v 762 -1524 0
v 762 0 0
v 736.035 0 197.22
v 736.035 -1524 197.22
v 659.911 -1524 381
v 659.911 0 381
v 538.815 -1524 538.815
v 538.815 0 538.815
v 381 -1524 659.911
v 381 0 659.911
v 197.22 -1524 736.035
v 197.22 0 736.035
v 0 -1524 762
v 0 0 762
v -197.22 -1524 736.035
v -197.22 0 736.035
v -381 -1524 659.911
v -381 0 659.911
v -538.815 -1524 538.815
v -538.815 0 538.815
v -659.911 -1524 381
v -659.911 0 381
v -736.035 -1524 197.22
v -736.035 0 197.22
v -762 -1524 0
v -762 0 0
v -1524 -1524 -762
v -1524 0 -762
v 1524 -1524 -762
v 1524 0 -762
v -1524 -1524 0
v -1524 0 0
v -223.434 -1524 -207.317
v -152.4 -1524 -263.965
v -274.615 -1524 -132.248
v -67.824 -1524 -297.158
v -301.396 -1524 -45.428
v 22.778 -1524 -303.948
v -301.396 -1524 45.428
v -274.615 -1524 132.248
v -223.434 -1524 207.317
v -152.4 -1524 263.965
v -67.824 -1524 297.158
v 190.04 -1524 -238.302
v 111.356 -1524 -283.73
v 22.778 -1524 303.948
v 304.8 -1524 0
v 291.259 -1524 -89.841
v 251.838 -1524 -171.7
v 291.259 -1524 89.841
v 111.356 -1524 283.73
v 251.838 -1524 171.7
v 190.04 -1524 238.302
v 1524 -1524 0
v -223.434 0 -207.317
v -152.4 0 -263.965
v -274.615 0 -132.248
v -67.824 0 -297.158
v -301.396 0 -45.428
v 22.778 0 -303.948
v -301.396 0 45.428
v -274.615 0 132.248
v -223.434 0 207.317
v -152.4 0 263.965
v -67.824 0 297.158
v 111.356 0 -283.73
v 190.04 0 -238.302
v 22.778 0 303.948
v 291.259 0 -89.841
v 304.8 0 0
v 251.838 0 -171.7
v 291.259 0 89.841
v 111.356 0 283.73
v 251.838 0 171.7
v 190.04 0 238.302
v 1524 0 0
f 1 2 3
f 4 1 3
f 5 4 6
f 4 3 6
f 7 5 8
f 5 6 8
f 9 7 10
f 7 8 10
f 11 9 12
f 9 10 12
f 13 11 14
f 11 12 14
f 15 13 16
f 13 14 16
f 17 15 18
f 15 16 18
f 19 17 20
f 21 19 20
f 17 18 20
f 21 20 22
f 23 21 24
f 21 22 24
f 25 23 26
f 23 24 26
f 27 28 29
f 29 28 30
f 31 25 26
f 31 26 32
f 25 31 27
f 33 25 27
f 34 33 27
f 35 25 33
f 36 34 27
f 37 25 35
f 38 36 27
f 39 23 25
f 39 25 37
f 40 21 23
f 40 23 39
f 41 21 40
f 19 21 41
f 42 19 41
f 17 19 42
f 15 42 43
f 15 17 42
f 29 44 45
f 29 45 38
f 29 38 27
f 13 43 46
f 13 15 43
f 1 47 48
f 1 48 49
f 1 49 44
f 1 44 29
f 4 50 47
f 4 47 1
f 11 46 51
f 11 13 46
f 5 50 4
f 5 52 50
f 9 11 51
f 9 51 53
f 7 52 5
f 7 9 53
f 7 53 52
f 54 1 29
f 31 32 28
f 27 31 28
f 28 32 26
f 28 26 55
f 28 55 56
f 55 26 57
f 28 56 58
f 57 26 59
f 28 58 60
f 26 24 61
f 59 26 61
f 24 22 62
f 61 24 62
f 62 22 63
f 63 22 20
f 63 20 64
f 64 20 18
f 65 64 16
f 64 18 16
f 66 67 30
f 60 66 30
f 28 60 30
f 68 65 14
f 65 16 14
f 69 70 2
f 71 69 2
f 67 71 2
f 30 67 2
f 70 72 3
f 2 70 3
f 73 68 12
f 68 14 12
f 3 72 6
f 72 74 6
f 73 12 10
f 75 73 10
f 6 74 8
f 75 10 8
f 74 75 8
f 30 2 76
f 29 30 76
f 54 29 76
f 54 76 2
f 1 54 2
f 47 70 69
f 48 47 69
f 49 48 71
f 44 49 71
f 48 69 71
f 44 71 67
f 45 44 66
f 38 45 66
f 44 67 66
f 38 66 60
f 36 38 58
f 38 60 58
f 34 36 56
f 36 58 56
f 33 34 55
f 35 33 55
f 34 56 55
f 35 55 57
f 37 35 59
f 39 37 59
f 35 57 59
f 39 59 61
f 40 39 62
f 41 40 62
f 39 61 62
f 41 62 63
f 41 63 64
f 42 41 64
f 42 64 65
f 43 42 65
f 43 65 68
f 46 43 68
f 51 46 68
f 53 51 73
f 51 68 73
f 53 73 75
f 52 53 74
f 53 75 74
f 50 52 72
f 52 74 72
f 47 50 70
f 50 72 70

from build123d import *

# Parameters (mm, degrees)
F1_DEPTH = 1524


with BuildPart() as f1:
    # F0 (on Front) → F1 (new body)
    with BuildSketch(Plane.XZ):
        with BuildLine():
            Line((1524, 0), (762, 0))
            ThreePointArc((762, 0), (0, 762), (-762, 0))
            Line((-762, 0), (-1524, 0))
            Line((-1524, 0), (-1524, -762))
            Line((-1524, -762), (1524, -762))
            Line((1524, -762), (1524, 0))
        make_face()
        with BuildLine():
            ThreePointArc((-304.8, 0), (0, 304.8), (304.8, 0))
            ThreePointArc((304.8, 0), (0, -304.8), (-304.8, 0))
        make_face(mode=Mode.SUBTRACT)
    extrude(amount=F1_DEPTH)


solid = f1.part
